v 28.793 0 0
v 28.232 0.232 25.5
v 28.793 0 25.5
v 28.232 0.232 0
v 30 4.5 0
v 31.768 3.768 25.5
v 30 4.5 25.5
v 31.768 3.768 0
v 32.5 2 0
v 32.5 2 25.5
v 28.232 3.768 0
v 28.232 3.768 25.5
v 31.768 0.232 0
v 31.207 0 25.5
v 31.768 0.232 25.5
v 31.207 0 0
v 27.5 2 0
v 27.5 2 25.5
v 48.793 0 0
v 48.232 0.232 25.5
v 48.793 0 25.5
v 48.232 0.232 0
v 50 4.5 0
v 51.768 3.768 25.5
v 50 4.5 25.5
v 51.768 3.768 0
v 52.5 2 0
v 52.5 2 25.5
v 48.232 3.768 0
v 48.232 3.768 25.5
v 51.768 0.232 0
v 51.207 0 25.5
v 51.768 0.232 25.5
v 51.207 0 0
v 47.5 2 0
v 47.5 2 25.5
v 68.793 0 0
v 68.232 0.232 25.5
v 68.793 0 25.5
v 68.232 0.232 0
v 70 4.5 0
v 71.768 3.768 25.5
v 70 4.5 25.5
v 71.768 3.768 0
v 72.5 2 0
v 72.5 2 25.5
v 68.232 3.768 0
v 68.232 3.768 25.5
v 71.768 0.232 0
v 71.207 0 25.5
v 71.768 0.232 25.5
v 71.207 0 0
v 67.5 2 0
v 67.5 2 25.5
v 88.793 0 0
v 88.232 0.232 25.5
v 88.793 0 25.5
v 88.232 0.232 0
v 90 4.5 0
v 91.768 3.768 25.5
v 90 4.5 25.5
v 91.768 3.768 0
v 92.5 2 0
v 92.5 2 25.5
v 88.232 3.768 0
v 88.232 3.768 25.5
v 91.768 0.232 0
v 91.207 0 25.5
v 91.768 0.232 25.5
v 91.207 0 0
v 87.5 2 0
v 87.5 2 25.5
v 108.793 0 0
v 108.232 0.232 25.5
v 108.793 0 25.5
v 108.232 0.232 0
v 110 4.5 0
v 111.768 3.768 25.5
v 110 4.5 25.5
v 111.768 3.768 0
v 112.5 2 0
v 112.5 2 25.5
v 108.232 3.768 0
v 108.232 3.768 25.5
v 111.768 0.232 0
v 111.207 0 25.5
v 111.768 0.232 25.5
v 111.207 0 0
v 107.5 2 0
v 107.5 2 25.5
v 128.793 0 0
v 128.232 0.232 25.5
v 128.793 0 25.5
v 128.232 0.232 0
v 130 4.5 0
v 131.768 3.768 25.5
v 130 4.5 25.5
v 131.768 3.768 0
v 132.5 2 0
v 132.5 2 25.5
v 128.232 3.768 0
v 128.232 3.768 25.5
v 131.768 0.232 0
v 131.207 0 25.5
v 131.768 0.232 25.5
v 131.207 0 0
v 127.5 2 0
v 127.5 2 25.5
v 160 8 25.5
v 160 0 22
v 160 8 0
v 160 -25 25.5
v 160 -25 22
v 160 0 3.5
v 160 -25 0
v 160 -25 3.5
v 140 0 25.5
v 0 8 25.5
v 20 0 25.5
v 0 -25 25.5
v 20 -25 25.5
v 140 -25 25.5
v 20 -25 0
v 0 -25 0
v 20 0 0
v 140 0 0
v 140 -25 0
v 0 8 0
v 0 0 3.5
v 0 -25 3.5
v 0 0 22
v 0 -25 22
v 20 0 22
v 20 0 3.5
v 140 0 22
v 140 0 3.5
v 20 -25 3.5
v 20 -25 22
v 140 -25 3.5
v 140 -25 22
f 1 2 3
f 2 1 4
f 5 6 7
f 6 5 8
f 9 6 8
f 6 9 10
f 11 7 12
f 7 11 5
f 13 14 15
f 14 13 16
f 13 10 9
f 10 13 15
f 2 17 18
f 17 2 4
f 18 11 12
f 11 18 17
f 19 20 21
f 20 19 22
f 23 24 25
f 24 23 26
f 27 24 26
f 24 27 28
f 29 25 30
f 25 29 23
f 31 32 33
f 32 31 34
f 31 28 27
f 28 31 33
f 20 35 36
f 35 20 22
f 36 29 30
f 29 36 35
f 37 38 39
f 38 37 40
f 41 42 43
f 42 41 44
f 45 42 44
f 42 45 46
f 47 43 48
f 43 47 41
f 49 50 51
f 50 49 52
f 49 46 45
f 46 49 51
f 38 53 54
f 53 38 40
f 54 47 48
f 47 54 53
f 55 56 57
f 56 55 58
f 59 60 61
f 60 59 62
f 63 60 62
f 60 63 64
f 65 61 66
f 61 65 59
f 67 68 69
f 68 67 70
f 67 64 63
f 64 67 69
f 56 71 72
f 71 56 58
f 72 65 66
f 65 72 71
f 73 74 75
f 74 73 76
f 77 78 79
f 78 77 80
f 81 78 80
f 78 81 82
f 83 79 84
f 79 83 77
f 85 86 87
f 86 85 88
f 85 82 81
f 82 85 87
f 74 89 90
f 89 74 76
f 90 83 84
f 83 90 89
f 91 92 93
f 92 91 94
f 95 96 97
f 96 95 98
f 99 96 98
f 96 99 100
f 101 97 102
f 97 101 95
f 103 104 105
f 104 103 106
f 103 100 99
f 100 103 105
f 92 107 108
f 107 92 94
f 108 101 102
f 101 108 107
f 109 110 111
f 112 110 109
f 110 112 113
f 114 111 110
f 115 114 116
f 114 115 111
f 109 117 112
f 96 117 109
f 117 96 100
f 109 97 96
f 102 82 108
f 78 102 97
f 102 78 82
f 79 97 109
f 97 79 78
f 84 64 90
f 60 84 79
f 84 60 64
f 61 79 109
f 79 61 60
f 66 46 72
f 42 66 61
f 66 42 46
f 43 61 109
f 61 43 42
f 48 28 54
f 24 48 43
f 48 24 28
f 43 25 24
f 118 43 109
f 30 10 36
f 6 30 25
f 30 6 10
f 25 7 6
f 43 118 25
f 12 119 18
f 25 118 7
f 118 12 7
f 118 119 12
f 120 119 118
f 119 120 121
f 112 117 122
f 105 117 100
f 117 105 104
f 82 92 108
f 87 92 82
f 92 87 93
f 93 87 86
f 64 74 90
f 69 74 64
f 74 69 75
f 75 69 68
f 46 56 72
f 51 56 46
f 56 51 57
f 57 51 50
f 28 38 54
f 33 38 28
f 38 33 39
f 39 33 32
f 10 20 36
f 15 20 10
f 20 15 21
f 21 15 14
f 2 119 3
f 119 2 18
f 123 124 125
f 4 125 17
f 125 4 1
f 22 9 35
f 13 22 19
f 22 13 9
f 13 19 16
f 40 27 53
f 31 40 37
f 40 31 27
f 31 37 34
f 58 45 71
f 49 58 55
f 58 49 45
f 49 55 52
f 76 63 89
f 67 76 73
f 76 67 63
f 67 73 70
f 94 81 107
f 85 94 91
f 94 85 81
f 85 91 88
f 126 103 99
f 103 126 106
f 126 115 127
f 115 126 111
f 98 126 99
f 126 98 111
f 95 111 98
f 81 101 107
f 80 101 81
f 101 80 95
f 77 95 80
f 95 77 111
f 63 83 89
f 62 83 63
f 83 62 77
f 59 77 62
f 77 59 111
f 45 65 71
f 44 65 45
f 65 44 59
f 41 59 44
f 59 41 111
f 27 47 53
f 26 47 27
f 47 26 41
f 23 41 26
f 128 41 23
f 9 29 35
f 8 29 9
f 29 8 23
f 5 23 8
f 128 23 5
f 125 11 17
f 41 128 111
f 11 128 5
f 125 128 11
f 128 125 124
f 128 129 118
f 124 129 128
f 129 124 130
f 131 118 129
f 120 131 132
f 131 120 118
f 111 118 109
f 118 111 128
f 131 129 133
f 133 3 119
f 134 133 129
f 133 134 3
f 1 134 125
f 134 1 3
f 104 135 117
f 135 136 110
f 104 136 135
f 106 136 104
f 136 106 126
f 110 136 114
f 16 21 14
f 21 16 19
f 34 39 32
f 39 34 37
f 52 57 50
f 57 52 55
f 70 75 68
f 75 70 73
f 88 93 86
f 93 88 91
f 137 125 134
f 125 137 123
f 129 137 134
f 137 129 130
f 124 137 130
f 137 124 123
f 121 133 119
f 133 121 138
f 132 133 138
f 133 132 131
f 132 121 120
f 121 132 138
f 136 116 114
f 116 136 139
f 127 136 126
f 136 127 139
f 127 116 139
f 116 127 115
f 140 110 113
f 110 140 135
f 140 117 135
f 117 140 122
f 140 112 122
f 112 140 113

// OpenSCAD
// How thick your desk is.
deskh = 18.5; // 
//How wide you want the cable catcher to be
fullWidth = 160;
//How deep (ensure it fits between your desk and the wall!)
depth = 8;
//The gap between usb cable slots
slotGap=20;
//The diameter of the slot to hold the usb cable 
slotDiameter = 5;
//How far to recess the slot.
slotRecess=2;
//Thickness of the tabs which hold the USB catcher to the desk
tabHeight = 3.5;  
// Tab width
tabWidth = 20;
//Tab length
tabLength = 25;
module cableCatcher() {
difference()
{
	cube([fullWidth, depth, deskh+2*tabHeight]);
		for (z = [tabWidth+(slotGap/2) : slotGap : fullWidth-(tabWidth+(slotGap/2))] ) 
		{
   			  translate([z, slotRecess,-5]) cylinder(r=slotDiameter/2.0, h=40);
    		}
}
 translate([0,-tabLength,0]) 	cube([tabWidth, tabLength,tabHeight]);
 translate([0,-tabLength,deskh+tabHeight]) cube([tabWidth, tabLength, tabHeight]);
 translate([fullWidth-tabWidth,-tabLength,0]) 	cube([tabWidth, tabLength, tabHeight]);
 translate([fullWidth-tabWidth,-tabLength,deskh+tabHeight]) cube([tabWidth, tabLength, tabHeight]);
}
cableCatcher();
